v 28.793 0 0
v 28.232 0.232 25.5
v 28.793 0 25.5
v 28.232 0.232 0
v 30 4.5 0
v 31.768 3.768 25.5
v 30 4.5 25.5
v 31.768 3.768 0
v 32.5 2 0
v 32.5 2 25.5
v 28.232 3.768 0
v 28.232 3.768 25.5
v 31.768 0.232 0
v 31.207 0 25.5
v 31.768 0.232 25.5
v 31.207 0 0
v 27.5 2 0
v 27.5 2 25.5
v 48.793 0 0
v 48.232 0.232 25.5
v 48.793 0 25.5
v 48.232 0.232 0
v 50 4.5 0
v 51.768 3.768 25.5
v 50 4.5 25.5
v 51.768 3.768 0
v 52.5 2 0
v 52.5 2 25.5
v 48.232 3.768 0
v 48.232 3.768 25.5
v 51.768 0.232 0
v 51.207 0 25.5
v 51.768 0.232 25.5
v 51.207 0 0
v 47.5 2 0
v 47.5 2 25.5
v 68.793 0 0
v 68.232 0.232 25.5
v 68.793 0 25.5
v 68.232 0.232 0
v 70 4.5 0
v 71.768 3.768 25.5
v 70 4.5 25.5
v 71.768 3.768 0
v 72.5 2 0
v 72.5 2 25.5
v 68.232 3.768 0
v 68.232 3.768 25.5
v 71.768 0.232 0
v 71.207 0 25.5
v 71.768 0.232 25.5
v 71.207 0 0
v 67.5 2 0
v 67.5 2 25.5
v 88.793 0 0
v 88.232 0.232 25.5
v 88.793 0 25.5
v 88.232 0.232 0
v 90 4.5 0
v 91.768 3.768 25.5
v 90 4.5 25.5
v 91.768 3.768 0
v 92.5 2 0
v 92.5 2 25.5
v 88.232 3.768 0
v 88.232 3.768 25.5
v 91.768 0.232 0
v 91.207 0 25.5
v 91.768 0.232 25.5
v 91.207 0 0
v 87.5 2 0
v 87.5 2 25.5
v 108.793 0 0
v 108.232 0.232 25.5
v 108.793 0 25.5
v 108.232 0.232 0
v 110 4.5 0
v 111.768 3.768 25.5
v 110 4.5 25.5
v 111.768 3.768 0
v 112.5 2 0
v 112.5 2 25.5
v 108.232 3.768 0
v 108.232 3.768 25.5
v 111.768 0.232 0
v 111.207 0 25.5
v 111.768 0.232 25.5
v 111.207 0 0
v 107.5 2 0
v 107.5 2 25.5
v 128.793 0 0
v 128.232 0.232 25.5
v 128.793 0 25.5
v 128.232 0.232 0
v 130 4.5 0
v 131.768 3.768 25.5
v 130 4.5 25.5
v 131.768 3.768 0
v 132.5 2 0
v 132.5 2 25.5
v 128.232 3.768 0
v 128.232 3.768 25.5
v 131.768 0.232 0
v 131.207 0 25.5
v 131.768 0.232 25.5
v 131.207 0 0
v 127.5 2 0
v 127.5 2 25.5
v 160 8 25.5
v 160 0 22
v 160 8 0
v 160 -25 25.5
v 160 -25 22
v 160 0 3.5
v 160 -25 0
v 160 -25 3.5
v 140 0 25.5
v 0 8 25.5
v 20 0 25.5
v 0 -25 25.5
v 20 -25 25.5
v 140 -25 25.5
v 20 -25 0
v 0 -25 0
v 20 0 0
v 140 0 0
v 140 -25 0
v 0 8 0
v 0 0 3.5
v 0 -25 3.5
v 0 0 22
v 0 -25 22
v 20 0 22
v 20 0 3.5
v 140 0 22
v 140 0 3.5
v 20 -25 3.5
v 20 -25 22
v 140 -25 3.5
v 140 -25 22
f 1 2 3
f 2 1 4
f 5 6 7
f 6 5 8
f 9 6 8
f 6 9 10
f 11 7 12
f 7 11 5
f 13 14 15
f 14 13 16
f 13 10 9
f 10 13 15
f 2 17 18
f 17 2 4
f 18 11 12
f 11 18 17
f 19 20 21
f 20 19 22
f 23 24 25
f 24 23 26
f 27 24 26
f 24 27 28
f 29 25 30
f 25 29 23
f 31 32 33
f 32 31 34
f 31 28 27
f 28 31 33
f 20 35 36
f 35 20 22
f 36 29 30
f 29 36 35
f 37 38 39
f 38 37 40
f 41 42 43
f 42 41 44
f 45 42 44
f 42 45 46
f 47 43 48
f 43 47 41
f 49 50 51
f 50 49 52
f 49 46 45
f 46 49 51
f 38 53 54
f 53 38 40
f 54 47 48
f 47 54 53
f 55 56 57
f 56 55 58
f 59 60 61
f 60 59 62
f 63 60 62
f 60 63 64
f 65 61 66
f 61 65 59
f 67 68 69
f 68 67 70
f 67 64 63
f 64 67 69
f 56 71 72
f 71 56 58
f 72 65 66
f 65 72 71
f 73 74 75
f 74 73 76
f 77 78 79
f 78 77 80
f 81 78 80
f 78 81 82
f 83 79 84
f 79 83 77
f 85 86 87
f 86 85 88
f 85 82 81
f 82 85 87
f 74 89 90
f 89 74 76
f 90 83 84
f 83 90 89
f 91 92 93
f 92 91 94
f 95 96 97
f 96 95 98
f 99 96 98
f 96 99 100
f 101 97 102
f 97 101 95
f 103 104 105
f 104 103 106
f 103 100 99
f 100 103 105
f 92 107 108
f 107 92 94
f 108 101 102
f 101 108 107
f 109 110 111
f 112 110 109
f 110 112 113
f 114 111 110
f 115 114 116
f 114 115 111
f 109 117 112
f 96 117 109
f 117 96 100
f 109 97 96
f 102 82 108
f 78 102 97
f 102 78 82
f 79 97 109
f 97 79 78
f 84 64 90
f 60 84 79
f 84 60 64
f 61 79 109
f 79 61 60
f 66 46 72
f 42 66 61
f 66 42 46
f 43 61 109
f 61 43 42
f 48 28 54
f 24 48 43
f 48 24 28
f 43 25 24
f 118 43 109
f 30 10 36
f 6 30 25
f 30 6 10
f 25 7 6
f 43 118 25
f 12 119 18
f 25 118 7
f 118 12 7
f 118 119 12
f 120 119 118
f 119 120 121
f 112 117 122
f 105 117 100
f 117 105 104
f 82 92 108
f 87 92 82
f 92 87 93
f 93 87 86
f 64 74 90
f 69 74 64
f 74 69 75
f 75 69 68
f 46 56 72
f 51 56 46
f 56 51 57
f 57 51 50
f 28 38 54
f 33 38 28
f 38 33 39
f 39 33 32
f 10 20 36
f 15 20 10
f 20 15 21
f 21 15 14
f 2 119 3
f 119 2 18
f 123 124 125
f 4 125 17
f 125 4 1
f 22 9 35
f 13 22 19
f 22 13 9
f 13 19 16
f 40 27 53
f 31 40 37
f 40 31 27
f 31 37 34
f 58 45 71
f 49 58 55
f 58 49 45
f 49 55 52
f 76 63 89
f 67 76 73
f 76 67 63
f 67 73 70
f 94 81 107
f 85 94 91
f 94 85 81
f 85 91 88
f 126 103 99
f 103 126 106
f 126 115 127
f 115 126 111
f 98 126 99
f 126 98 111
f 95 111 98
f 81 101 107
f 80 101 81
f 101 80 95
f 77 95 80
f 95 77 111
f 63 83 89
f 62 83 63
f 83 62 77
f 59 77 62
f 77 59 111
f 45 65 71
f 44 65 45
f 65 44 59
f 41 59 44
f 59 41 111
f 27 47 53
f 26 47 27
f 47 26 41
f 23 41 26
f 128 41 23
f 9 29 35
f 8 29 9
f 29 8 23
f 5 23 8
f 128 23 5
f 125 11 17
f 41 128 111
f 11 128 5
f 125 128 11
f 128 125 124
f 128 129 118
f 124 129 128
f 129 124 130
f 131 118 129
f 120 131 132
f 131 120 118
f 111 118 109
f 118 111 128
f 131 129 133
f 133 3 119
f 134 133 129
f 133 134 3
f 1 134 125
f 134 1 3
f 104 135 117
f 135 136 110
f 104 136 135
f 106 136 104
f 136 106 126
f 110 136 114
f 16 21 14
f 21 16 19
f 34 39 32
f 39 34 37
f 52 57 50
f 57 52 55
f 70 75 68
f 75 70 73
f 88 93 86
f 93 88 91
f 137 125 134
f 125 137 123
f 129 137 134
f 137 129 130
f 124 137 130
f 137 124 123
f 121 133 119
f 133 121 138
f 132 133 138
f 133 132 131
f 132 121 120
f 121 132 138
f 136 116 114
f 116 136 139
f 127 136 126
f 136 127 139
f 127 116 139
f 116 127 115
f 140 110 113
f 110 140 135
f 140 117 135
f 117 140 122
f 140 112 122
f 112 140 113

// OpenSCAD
// How thick your desk is.
deskh = 18.5; // 
//How wide you want the cable catcher to be
fullWidth = 160;
//How deep (ensure it fits between your desk and the wall!)
depth = 8;
//The gap between usb cable slots
slotGap=20;
//The diameter of the slot to hold the usb cable 
slotDiameter = 5;
//How far to recess the slot.
slotRecess=2;
//Thickness of the tabs which hold the USB catcher to the desk
tabHeight = 3.5;  
// Tab width
tabWidth = 20;
//Tab length
tabLength = 25;
module cableCatcher() {
difference()
{
	cube([fullWidth, depth, deskh+2*tabHeight]);
		for (z = [tabWidth+(slotGap/2) : slotGap : fullWidth-(tabWidth+(slotGap/2))] ) 
		{
   			  translate([z, slotRecess,-5]) cylinder(r=slotDiameter/2.0, h=40);
    		}
}
 translate([0,-tabLength,0]) 	cube([tabWidth, tabLength,tabHeight]);
 translate([0,-tabLength,deskh+tabHeight]) cube([tabWidth, tabLength, tabHeight]);
 translate([fullWidth-tabWidth,-tabLength,0]) 	cube([tabWidth, tabLength, tabHeight]);
 translate([fullWidth-tabWidth,-tabLength,deskh+tabHeight]) cube([tabWidth, tabLength, tabHeight]);
}
cableCatcher();
